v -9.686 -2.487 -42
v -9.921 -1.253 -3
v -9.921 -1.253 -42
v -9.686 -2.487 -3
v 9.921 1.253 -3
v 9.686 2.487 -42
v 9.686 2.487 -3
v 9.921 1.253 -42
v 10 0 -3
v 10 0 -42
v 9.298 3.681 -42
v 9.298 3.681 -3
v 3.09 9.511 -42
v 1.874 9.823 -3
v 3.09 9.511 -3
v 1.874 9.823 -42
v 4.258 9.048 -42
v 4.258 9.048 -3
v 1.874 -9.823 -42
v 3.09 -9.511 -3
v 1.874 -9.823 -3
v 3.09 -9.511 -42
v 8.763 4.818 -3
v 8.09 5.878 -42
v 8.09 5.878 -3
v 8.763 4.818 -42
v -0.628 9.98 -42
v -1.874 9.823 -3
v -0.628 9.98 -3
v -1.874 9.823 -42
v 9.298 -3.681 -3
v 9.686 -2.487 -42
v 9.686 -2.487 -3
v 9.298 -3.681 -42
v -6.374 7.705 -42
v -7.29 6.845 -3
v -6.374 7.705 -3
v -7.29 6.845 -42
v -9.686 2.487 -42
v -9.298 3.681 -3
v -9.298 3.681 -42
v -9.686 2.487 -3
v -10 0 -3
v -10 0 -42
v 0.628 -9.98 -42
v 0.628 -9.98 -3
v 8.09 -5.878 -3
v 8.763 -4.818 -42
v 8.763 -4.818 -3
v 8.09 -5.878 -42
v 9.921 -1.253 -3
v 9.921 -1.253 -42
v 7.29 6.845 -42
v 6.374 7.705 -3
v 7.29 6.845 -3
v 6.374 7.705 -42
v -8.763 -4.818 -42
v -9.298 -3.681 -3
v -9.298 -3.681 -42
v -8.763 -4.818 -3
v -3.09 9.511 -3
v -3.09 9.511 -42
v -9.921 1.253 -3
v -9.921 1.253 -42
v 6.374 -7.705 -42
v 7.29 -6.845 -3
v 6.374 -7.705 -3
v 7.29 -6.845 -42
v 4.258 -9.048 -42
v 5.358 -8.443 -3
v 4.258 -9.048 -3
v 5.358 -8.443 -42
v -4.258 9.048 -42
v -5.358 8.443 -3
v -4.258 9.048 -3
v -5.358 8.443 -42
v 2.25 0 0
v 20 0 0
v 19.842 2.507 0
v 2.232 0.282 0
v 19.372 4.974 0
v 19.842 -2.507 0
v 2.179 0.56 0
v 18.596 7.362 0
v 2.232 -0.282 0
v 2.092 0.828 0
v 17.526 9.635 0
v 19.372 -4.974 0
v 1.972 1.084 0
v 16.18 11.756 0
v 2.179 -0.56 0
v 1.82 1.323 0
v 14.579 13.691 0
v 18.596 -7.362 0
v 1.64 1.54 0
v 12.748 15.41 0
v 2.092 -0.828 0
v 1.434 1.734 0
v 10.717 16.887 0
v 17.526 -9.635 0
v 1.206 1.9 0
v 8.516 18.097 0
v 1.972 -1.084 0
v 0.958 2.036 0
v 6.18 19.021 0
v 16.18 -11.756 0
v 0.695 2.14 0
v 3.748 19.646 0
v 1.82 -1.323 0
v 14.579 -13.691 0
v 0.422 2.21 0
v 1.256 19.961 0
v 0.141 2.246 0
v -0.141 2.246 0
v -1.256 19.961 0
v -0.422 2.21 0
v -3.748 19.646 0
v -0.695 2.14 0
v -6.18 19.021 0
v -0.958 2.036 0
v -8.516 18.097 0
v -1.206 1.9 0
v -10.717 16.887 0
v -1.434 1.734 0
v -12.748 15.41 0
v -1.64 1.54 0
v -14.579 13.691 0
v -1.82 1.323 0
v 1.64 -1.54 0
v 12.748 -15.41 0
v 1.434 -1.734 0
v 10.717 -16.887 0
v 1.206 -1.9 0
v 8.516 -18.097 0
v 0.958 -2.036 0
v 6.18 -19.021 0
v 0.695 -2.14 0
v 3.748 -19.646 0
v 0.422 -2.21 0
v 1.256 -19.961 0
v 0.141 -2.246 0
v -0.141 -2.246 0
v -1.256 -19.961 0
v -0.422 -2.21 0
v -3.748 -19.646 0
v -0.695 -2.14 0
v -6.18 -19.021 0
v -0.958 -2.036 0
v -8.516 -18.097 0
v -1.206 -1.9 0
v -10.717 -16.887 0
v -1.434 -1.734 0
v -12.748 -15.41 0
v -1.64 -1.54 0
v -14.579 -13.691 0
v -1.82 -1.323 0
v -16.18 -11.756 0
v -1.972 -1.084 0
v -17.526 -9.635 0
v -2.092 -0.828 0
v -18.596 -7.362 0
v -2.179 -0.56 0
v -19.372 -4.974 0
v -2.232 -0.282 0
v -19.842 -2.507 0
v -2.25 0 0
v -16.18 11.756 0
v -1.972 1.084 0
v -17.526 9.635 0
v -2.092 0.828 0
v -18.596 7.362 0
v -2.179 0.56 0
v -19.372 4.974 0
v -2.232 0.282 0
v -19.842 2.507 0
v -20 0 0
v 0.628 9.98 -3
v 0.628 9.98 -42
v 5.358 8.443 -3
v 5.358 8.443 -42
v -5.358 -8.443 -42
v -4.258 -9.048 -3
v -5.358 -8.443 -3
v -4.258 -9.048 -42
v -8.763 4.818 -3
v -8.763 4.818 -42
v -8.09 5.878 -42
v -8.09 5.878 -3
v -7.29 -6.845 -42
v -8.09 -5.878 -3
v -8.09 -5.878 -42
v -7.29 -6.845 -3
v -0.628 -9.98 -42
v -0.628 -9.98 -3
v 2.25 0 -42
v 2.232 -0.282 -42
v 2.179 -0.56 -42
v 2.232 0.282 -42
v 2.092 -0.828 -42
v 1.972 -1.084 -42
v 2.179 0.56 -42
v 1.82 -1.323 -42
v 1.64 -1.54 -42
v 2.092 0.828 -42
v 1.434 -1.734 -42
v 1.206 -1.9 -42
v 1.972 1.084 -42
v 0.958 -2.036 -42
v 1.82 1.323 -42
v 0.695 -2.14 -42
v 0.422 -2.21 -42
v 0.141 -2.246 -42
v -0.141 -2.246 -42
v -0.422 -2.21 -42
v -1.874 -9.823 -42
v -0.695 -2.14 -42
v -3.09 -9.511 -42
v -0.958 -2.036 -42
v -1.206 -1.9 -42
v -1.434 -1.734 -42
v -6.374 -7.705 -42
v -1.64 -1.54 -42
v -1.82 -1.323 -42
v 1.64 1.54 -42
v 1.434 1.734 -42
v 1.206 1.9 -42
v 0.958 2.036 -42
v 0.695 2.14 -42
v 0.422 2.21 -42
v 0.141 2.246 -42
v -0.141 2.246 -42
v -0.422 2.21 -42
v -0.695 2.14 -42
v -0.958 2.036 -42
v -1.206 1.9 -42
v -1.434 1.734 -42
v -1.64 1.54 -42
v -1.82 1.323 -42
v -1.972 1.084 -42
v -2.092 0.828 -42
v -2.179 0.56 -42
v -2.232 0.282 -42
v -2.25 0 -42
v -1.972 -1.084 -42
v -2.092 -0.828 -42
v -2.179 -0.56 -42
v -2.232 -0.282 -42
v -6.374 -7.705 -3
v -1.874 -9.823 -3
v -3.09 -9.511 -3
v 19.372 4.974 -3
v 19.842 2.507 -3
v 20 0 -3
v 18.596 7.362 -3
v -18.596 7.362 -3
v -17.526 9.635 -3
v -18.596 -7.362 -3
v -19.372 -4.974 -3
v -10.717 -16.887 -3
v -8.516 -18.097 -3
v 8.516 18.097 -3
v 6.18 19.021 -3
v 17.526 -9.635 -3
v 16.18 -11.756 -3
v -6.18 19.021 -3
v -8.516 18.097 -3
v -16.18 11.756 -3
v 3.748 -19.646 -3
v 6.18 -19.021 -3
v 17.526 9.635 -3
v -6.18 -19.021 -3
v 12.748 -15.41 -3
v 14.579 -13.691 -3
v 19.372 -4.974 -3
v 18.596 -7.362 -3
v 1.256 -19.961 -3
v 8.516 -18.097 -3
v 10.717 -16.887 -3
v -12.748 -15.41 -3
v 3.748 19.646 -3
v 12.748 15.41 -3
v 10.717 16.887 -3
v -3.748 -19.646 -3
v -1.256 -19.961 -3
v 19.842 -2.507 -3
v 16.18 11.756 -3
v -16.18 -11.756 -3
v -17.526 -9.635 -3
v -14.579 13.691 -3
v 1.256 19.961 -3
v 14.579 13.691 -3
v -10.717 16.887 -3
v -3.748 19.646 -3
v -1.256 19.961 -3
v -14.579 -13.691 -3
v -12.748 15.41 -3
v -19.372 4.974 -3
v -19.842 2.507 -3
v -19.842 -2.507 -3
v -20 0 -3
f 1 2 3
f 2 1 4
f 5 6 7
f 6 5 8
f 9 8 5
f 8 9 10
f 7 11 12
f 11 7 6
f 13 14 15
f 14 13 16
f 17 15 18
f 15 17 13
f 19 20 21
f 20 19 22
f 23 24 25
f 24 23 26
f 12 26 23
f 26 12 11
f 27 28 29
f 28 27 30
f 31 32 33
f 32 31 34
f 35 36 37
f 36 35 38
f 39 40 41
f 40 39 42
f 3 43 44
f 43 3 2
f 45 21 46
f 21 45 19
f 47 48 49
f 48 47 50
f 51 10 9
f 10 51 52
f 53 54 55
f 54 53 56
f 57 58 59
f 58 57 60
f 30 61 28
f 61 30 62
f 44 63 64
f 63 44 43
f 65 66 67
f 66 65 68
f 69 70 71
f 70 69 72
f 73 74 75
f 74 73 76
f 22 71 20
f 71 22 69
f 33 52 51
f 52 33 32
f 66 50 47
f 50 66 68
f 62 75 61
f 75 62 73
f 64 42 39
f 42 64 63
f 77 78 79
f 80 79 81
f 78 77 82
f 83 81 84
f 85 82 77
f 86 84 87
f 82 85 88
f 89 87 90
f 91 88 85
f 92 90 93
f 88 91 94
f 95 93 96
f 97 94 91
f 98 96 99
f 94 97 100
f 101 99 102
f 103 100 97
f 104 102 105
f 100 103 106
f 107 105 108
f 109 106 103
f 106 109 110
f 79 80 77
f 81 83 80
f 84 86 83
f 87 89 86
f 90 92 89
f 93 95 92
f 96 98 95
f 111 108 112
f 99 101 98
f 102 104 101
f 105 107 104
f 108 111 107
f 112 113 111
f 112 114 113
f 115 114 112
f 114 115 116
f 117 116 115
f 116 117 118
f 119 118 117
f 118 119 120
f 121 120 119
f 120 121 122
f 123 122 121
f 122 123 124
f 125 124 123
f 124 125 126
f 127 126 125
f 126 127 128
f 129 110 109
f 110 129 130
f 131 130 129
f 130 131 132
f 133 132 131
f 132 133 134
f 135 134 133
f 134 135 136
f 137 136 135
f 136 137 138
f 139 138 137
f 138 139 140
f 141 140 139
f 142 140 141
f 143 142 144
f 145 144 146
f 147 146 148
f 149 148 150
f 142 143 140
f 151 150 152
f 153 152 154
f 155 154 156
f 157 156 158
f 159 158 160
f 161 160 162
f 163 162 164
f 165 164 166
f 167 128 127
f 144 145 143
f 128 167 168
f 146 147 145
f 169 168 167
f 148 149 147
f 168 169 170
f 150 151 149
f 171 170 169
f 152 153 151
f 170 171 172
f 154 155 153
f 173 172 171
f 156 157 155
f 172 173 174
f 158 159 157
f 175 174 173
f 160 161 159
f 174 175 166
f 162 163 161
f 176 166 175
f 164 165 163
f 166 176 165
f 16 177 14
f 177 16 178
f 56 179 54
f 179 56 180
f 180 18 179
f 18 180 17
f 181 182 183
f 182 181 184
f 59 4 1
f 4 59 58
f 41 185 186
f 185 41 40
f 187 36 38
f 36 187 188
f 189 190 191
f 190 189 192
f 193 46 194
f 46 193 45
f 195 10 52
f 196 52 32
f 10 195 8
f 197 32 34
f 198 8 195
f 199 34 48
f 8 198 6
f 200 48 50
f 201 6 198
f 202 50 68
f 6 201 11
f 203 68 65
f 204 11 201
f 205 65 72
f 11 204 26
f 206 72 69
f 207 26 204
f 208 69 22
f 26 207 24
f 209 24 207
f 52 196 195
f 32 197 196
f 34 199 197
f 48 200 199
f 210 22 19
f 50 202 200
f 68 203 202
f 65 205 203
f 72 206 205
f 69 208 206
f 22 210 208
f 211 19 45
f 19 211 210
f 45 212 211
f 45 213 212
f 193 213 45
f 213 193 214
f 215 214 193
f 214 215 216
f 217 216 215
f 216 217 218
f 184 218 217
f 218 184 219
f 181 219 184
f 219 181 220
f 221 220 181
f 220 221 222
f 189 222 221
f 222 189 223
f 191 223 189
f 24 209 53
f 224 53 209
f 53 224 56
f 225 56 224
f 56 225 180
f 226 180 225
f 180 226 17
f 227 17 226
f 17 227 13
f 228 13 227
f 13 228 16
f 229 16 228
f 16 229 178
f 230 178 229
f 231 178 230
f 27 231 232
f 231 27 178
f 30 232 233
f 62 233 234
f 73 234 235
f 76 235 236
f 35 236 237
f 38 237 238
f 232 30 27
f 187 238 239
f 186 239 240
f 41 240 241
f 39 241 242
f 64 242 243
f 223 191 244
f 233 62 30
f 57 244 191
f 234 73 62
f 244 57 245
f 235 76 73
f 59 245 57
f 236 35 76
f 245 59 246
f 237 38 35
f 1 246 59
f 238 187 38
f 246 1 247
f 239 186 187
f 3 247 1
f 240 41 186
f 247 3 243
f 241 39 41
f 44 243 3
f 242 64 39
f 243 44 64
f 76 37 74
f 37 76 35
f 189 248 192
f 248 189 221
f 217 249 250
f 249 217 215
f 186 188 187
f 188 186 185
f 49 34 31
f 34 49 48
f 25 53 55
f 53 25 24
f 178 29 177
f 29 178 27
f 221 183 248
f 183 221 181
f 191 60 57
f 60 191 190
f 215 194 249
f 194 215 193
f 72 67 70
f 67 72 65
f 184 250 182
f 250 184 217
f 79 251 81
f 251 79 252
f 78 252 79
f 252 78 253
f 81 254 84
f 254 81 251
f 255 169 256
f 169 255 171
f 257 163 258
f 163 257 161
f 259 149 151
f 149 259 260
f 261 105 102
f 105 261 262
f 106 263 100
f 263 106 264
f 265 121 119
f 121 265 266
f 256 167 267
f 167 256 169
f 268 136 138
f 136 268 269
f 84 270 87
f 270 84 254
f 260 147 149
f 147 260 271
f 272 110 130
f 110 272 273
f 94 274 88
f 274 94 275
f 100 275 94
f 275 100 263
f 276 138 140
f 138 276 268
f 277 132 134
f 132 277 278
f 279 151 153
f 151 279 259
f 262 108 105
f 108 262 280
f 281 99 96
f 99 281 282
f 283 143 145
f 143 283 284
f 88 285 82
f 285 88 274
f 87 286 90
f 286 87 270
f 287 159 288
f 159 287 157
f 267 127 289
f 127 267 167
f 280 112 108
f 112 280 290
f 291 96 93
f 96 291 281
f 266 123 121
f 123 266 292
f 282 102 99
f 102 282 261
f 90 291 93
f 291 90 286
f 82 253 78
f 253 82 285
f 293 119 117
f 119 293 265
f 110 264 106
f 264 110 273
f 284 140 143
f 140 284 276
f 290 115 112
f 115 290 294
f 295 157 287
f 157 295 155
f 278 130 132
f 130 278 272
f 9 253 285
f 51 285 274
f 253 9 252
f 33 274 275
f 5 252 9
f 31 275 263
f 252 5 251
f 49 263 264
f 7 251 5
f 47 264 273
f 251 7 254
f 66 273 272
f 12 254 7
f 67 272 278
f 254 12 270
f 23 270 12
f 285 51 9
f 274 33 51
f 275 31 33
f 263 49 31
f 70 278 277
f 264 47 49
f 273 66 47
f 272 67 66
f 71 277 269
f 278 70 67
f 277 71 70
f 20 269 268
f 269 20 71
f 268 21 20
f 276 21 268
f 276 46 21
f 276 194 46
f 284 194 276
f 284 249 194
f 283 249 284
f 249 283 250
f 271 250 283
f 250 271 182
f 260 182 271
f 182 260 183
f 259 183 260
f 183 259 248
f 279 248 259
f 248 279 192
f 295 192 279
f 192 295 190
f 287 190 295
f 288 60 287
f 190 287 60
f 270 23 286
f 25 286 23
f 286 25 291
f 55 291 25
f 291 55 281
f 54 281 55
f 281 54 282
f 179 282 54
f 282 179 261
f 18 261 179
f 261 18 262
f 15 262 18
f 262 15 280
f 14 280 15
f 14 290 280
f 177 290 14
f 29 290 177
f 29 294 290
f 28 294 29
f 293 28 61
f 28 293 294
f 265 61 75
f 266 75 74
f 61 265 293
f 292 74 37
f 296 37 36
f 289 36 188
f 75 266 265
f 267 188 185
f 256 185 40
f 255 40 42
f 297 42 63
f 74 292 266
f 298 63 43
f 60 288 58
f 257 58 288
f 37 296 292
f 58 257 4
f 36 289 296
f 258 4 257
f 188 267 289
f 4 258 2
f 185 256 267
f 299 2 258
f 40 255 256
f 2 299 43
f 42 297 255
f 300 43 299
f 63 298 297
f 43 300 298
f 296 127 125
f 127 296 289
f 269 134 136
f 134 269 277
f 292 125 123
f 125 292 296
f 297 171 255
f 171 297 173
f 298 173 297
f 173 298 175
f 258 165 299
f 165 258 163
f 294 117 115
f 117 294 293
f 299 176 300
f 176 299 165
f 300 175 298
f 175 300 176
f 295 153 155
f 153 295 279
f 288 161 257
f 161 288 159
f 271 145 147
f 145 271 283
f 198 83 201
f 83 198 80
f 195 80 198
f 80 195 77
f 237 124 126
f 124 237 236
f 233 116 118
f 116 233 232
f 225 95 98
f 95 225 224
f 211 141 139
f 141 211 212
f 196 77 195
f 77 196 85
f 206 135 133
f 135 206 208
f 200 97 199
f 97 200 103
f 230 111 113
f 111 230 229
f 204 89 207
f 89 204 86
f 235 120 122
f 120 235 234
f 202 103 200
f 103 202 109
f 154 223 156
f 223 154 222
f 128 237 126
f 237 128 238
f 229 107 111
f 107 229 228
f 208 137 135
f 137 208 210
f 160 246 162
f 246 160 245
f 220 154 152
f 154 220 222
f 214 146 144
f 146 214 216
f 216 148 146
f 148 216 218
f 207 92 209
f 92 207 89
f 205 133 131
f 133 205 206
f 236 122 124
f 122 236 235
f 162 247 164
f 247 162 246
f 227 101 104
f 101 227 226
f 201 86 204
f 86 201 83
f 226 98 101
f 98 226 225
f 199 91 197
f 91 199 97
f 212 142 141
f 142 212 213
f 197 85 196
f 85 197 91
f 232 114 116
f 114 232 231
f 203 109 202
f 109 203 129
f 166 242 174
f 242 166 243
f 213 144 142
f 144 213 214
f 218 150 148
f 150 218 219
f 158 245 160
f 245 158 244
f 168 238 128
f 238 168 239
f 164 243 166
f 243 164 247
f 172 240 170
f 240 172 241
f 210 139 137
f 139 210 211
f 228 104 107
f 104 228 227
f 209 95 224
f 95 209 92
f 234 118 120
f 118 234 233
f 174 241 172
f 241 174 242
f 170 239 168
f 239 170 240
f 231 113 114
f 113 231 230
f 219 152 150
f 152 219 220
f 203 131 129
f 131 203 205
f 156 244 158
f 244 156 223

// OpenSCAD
$fn = 50;


difference() {
	union() {
		translate(v = [0, 0, -42.0000000000]) {
			cylinder(h = 42, r = 10.0000000000);
		}
		translate(v = [0, 0, -3.0000000000]) {
			cylinder(h = 3, r = 20.0000000000);
		}
	}
	union() {
		#translate(v = [0, 0, -42]) {
			cylinder(h = 42, r = 2.2500000000);
		}
	}
}
